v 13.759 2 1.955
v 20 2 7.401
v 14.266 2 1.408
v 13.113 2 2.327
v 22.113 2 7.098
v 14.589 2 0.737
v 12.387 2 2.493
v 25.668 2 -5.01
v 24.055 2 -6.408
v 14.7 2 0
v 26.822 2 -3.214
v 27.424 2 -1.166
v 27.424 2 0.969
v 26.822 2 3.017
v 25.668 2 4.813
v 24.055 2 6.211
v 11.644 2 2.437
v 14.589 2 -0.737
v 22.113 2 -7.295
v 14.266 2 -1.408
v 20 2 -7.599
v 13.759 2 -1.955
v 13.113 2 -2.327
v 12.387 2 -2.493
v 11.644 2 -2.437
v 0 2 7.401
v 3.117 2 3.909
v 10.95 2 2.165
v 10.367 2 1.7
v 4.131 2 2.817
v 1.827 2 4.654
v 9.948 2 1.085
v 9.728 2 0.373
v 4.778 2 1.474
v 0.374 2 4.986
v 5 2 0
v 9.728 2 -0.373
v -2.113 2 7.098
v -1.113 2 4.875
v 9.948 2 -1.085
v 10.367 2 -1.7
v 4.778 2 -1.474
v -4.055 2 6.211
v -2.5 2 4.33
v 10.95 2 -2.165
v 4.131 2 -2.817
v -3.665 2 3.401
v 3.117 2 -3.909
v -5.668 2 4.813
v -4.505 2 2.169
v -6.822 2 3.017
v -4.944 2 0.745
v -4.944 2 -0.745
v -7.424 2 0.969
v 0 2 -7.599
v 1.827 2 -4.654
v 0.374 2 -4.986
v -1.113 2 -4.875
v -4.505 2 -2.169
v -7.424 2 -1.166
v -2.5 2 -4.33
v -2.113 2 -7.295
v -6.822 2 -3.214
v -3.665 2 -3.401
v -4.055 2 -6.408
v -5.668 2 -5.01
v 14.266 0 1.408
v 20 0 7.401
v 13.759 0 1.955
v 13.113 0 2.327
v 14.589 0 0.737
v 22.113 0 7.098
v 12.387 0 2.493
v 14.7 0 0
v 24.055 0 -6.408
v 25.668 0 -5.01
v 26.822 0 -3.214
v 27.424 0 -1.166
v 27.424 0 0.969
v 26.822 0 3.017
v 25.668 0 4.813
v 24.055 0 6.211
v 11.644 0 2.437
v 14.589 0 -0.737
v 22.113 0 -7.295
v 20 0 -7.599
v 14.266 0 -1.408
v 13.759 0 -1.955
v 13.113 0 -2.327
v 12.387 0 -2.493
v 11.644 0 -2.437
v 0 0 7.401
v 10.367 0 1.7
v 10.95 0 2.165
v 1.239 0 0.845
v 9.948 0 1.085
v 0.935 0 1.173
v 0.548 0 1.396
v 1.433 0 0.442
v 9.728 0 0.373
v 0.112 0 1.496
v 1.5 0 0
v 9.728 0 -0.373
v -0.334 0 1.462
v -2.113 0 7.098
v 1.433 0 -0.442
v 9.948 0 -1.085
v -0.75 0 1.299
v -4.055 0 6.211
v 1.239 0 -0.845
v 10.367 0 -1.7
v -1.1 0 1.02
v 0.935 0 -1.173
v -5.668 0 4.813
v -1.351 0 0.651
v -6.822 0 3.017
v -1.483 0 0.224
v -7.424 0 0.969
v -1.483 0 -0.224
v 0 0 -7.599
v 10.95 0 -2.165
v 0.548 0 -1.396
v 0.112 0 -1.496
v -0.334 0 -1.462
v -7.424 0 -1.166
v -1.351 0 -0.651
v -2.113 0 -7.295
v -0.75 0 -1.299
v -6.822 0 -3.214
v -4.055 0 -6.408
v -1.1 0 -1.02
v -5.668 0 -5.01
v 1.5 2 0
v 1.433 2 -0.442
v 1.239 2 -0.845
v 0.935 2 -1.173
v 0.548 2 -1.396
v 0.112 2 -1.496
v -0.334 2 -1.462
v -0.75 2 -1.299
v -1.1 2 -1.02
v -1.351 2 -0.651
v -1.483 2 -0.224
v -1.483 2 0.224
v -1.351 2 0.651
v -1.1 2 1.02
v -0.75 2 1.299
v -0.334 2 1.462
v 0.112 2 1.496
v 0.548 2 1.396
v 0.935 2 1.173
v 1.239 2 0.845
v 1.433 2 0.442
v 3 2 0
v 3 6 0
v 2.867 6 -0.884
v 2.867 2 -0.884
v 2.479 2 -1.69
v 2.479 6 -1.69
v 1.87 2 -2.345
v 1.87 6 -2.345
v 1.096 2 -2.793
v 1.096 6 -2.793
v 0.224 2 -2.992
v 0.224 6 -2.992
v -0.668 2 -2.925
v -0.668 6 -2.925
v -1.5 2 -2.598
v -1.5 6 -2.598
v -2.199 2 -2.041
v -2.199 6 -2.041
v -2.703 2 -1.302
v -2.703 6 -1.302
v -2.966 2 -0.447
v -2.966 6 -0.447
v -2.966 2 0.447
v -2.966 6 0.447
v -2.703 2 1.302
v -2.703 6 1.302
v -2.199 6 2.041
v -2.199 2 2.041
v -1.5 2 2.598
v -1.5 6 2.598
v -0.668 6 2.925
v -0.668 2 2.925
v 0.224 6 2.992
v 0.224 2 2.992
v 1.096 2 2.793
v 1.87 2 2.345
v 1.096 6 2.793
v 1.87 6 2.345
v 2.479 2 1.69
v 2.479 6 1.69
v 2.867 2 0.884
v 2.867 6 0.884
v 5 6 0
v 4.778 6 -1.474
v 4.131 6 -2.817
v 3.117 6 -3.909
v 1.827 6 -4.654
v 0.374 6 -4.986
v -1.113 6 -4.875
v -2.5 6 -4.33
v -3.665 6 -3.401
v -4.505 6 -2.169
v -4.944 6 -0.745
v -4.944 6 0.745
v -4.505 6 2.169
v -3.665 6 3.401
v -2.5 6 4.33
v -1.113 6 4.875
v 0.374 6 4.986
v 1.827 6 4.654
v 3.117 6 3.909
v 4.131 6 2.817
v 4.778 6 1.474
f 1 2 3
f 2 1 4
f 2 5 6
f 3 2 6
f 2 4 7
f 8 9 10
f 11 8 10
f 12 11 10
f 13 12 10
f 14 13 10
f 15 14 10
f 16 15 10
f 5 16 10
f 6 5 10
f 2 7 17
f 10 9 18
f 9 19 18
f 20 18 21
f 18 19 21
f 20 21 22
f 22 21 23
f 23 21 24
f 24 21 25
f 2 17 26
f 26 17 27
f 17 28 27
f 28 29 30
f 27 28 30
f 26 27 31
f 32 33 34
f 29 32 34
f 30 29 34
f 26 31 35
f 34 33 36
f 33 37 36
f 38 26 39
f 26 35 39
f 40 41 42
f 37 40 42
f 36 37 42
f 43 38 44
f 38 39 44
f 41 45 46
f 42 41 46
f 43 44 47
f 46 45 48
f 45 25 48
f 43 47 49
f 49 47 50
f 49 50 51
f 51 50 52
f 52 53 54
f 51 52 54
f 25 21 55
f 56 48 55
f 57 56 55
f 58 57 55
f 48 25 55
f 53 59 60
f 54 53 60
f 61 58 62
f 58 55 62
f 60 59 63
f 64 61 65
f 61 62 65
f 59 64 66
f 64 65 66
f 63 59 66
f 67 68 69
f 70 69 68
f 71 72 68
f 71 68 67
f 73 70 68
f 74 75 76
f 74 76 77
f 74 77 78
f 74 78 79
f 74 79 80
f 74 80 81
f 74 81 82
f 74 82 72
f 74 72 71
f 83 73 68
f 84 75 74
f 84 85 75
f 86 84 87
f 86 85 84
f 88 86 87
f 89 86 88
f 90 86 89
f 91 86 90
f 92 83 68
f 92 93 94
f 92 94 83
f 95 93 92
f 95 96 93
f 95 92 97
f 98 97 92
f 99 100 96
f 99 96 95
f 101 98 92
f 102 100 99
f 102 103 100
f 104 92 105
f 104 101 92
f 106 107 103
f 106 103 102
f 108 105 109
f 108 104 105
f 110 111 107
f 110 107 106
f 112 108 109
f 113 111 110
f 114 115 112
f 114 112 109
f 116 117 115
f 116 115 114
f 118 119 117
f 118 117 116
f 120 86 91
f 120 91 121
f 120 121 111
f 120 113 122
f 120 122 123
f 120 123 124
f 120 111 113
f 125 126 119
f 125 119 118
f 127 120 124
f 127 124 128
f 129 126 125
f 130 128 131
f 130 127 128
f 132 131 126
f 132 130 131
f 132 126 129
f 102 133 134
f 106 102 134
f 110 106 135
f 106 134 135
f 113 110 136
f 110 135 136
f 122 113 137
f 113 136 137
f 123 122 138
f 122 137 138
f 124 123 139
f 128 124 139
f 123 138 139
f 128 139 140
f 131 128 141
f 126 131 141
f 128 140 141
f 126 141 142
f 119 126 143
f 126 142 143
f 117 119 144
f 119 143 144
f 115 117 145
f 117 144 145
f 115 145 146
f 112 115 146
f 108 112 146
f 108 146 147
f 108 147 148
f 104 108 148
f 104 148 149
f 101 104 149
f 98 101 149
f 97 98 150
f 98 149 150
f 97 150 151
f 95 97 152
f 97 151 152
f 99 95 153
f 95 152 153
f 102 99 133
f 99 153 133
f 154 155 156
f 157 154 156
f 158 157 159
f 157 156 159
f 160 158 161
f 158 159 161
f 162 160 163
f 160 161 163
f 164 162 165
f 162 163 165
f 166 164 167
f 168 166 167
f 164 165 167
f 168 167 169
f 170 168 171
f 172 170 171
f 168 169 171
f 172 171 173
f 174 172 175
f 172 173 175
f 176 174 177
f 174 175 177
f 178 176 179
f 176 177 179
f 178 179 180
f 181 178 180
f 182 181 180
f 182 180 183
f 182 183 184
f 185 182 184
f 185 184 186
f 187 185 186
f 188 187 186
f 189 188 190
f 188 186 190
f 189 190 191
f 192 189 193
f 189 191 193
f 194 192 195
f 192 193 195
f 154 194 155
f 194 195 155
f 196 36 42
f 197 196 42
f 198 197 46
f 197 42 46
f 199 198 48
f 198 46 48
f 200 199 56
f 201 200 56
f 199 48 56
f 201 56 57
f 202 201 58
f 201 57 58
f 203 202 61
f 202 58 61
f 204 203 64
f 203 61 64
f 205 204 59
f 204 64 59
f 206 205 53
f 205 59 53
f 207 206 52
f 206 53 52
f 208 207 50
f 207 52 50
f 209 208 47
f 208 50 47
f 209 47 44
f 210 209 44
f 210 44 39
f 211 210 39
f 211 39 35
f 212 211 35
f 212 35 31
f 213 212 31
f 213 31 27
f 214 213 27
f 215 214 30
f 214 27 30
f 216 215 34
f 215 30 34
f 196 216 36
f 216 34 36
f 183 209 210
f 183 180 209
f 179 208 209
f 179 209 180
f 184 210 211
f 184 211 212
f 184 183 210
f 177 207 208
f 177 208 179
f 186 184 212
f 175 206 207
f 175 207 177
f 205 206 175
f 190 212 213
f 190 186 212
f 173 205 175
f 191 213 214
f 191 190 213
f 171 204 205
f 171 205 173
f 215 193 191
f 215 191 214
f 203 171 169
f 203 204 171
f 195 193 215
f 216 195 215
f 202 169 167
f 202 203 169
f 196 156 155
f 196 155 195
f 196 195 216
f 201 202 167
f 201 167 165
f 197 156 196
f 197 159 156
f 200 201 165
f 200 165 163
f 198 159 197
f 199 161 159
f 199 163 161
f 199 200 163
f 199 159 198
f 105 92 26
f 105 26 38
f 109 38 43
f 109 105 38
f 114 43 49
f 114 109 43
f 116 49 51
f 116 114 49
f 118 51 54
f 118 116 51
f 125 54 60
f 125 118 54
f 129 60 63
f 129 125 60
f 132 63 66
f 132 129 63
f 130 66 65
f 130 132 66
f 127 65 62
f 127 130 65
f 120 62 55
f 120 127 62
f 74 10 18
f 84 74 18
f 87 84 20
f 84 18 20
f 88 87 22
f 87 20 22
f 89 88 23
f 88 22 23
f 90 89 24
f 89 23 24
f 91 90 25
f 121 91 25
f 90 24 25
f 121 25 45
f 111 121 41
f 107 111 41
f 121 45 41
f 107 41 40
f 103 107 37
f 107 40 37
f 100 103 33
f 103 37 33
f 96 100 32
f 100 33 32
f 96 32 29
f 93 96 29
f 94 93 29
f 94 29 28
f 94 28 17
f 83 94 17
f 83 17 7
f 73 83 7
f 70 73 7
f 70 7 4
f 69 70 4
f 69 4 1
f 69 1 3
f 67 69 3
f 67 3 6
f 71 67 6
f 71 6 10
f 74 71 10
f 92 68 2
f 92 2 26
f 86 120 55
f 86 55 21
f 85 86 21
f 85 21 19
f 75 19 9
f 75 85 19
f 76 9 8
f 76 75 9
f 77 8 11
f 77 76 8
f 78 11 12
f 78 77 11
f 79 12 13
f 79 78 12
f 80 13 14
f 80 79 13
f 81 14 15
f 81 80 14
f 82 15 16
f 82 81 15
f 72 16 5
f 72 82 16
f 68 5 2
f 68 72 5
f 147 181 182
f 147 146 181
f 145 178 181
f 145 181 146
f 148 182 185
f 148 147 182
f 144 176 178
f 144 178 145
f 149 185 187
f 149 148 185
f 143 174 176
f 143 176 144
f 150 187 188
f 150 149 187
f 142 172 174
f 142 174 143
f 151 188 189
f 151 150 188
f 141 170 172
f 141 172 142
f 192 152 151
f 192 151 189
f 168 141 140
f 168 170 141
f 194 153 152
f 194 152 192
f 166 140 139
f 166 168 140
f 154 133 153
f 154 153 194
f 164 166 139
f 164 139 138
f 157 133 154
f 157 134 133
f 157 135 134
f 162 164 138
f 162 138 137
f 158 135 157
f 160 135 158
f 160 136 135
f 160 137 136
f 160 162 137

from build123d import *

# Parameters (mm, degrees)
BOSS_EXTRUDE1_DEPTH = 2
SKETCH2_R           = 5
BOSS_EXTRUDE3_DEPTH = 4
SKETCH5_R           = 3
CUT_EXTRUDE1_DEPTH  = 4
SKETCH6_R           = 1.5
CUT_EXTRUDE2_DEPTH  = 2
SKETCH7_R           = 2.5
CUT_EXTRUDE4_DEPTH  = 3


with BuildPart() as part:
    # Sketch1 → Boss-Extrude1 (new body)
    with BuildSketch(Plane(origin=(0, 0, 0), x_dir=(1, 0, 0), z_dir=(0, 1, 0))):
        with BuildLine():
            Line((0, 7.598649923), (20, 7.598649923))
            ThreePointArc((20, 7.598649923), (27.5, 0.098649923), (20, -7.401350077))
            Line((20, -7.401350077), (0, -7.401350077))
            ThreePointArc((0, -7.401350077), (-7.5, 0.098649923), (0, 7.598649923))
        make_face()
    extrude(amount=BOSS_EXTRUDE1_DEPTH)

    # Sketch2 → Boss-Extrude3 (add)
    with BuildSketch(Plane(origin=(0, 2, 0), x_dir=(1, 0, 0), z_dir=(0, 1, 0))):
        Circle(SKETCH2_R)
    extrude(amount=BOSS_EXTRUDE3_DEPTH)

    # Sketch5 → Cut-Extrude1 (cut)
    with BuildSketch(Plane(origin=(0, 6, 0), x_dir=(1, 0, 0), z_dir=(0, 1, 0))):
        Circle(SKETCH5_R)
    extrude(amount=-CUT_EXTRUDE1_DEPTH, mode=Mode.SUBTRACT)

    # Sketch6 → Cut-Extrude2 (cut)
    with BuildSketch(Plane(origin=(0, 2, 0), x_dir=(1, 0, 0), z_dir=(0, 1, 0))):
        Circle(SKETCH6_R)
    extrude(amount=-CUT_EXTRUDE2_DEPTH, mode=Mode.SUBTRACT)

    # Sketch7 → Cut-Extrude4 (cut, through all)
    with BuildSketch(Plane(origin=(0, 2, 0), x_dir=(1, 0, 0), z_dir=(0, 1, 0))):
        with Locations((12.2, 0)):
            Circle(SKETCH7_R)
    extrude(amount=-CUT_EXTRUDE4_DEPTH, mode=Mode.SUBTRACT)


solid = part.part
